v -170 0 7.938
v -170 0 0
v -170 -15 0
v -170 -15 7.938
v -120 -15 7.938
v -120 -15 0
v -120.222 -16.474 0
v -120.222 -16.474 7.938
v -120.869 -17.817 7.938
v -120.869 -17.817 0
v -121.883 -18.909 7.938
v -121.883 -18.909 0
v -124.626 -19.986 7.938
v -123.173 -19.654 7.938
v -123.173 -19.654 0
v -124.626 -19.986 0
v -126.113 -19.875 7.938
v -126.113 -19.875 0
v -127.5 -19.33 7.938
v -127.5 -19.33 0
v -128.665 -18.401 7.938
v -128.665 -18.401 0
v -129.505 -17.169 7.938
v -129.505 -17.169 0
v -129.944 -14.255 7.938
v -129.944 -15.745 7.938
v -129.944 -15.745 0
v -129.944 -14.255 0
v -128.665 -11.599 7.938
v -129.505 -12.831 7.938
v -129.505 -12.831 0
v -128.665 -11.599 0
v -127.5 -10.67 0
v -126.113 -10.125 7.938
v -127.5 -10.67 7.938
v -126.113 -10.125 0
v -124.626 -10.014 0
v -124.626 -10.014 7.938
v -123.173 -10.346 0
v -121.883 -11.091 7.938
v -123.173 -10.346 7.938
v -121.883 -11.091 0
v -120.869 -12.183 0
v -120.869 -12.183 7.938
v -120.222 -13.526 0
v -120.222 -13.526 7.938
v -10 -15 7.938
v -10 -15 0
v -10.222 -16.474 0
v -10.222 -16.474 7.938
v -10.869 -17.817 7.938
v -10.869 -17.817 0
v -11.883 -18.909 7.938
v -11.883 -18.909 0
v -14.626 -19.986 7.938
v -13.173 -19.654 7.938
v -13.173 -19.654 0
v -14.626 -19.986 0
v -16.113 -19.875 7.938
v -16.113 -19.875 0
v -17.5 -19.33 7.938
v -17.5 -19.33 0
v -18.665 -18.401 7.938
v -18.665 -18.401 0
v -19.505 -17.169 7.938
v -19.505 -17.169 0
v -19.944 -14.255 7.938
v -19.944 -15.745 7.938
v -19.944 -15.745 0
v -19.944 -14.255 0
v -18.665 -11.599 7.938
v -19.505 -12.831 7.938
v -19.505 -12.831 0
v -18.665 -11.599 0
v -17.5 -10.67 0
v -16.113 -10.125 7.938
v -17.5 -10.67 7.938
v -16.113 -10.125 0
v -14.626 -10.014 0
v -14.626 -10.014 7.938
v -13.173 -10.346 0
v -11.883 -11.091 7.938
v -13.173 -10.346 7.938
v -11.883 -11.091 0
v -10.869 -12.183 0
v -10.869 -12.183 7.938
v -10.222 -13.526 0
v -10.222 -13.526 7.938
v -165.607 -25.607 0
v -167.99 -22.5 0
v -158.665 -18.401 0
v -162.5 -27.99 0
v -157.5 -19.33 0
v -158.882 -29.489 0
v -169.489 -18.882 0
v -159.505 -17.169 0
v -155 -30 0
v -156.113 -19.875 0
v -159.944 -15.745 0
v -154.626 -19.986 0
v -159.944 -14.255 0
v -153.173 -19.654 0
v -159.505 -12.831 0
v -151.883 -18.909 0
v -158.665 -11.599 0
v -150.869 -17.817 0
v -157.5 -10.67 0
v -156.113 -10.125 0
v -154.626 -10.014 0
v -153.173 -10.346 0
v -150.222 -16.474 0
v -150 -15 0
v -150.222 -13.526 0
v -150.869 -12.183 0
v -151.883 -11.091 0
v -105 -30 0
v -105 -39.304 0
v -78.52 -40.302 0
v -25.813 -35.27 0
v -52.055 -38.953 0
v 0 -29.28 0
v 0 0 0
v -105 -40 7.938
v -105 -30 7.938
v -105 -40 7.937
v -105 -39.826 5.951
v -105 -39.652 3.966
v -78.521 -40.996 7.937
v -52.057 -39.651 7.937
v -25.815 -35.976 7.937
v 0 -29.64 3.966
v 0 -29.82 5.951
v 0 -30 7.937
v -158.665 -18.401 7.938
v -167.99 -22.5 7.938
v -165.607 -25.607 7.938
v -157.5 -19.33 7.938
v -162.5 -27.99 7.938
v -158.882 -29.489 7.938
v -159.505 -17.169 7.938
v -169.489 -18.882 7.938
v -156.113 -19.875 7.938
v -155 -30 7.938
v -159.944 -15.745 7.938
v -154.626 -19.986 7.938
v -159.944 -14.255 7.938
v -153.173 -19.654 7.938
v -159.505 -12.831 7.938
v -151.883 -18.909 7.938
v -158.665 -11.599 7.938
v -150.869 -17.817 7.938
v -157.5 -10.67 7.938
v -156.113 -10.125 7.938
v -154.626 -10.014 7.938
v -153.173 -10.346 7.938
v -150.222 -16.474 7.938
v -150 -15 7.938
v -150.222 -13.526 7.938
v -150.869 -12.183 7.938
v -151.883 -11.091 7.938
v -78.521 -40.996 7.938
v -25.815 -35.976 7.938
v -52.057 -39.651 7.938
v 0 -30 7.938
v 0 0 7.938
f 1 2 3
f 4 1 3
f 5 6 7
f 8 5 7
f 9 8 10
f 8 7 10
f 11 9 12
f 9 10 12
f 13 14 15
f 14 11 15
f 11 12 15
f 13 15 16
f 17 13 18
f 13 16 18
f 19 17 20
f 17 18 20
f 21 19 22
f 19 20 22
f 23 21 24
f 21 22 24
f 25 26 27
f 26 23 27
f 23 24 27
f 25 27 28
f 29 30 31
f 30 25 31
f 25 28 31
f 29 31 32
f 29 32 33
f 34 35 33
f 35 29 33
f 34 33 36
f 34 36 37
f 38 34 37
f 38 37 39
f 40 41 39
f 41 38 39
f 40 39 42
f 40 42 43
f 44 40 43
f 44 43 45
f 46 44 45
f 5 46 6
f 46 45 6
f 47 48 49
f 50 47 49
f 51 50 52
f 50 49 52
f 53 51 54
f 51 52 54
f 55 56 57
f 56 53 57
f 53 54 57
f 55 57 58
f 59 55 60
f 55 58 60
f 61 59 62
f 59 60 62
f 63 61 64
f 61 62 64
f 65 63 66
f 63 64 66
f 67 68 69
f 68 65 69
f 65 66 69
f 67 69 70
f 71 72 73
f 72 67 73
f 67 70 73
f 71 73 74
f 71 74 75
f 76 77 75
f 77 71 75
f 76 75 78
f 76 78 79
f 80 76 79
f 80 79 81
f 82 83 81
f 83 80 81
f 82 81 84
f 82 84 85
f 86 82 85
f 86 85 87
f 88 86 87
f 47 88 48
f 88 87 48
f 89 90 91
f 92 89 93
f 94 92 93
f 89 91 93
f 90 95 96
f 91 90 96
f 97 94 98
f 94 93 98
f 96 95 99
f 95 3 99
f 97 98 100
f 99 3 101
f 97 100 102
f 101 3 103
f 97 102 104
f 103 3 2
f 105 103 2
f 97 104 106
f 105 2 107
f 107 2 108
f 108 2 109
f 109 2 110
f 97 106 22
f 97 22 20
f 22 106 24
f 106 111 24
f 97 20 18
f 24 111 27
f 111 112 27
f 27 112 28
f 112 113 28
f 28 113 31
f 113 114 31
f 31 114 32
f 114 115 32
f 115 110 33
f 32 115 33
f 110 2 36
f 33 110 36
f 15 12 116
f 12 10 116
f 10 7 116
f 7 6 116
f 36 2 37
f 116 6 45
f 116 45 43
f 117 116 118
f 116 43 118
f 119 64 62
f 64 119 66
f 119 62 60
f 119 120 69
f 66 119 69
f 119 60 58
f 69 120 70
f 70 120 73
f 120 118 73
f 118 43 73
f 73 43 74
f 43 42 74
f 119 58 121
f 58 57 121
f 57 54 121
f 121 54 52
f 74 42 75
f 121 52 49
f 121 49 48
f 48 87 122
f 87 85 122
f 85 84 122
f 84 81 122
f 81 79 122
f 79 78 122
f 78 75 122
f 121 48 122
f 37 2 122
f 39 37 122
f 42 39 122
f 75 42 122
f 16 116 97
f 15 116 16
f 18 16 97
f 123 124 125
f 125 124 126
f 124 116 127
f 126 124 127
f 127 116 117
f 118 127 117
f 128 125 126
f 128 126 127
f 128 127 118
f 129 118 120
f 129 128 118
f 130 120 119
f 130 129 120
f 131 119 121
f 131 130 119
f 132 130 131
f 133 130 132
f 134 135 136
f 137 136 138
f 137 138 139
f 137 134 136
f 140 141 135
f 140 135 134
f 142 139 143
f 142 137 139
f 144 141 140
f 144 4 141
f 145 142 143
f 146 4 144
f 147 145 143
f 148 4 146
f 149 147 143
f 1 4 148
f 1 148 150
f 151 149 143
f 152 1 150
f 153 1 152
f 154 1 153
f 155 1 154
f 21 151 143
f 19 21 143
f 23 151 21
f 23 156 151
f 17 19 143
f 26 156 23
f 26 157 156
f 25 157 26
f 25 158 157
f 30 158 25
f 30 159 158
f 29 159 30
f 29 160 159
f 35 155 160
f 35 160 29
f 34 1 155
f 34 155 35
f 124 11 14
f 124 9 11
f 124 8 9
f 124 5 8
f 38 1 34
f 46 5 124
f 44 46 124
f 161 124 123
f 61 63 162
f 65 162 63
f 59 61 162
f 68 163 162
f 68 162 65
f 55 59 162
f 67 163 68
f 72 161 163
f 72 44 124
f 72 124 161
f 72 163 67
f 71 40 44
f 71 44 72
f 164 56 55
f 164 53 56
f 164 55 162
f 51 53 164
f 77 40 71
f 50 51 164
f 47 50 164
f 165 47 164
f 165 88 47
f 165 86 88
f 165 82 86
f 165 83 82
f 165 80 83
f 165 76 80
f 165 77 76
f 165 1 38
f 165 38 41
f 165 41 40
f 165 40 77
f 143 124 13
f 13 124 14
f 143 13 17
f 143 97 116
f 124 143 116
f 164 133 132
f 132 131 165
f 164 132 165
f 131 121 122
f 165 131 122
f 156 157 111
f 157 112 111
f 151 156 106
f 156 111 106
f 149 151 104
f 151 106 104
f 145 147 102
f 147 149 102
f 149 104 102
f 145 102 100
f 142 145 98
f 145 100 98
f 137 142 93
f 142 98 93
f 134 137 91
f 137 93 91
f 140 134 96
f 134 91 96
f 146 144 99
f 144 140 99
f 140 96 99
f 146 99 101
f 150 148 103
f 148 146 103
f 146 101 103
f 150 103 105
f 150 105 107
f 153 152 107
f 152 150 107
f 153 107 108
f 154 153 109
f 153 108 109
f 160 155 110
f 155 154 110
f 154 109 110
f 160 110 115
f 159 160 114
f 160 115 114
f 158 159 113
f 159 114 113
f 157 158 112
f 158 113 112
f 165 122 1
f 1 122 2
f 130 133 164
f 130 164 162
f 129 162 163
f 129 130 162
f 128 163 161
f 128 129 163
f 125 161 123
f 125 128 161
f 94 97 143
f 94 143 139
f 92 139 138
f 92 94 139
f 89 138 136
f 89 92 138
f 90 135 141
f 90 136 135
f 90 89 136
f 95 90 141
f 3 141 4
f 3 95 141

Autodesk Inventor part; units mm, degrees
ref_plane "YZ Plane" through (0, 0, 0) normal (1, 0, 0) x (0, 1, 0)
ref_plane "XZ Plane" through (0, 0, 0) normal (0, 1, 0) x (-1, 0, 0)
ref_plane "XY Plane" through (0, 0, 0) normal (0, 0, 1) x (1, 0, 0)
sketch "Sketch1" plane through (0, 0, 0) normal (0, 0, 1) x (1, 0, 0)
  line L0 (0, -30) -> (0, 0)
  line L1 (0, 0) -> (-170, 0)
  line L2 (-170, 0) -> (-170, -15)
  line L3 (-155, -30) -> (-105, -30)
  line L4 (-105, -30) -> (-105, -40)
  arc A0 (-105, -40) -> (0, -30) centre (-80.4998, 258.9979) ccw
  arc A1 (-170, -15) -> (-155, -30) centre (-155, -15) ccw
  circle A2 centre (-155, -15) radius 5
  circle A3 centre (-125, -15) radius 5
  circle A4 centre (-15, -15) radius 5
  point P0 (-170, -30)
  dimension "d0" = 170
  dimension "d1" = 30
  dimension "d2" = 30
  dimension "d3" = 65
  dimension "d4" = 10
  dimension "d6" = 300
  dimension "d7" = 15
  dimension "d8" = 10
  dimension "d9" = 10
  dimension "d10" = 10
  dimension "d11" = 15
  dimension "d12" = 30
  dimension "d13" = 15
  dimension "d14" = 15
extrude "Extrusion1" add sketch "Sketch1" along normal blind 7.9375
chamfer "Chamfer1" distance 7.9375 angle 5 1 edges at (-52.0571, -39.6507, 0) measured on face at (-48.5408, -39.295, 5.2917)
properties part number "Upper blade"
